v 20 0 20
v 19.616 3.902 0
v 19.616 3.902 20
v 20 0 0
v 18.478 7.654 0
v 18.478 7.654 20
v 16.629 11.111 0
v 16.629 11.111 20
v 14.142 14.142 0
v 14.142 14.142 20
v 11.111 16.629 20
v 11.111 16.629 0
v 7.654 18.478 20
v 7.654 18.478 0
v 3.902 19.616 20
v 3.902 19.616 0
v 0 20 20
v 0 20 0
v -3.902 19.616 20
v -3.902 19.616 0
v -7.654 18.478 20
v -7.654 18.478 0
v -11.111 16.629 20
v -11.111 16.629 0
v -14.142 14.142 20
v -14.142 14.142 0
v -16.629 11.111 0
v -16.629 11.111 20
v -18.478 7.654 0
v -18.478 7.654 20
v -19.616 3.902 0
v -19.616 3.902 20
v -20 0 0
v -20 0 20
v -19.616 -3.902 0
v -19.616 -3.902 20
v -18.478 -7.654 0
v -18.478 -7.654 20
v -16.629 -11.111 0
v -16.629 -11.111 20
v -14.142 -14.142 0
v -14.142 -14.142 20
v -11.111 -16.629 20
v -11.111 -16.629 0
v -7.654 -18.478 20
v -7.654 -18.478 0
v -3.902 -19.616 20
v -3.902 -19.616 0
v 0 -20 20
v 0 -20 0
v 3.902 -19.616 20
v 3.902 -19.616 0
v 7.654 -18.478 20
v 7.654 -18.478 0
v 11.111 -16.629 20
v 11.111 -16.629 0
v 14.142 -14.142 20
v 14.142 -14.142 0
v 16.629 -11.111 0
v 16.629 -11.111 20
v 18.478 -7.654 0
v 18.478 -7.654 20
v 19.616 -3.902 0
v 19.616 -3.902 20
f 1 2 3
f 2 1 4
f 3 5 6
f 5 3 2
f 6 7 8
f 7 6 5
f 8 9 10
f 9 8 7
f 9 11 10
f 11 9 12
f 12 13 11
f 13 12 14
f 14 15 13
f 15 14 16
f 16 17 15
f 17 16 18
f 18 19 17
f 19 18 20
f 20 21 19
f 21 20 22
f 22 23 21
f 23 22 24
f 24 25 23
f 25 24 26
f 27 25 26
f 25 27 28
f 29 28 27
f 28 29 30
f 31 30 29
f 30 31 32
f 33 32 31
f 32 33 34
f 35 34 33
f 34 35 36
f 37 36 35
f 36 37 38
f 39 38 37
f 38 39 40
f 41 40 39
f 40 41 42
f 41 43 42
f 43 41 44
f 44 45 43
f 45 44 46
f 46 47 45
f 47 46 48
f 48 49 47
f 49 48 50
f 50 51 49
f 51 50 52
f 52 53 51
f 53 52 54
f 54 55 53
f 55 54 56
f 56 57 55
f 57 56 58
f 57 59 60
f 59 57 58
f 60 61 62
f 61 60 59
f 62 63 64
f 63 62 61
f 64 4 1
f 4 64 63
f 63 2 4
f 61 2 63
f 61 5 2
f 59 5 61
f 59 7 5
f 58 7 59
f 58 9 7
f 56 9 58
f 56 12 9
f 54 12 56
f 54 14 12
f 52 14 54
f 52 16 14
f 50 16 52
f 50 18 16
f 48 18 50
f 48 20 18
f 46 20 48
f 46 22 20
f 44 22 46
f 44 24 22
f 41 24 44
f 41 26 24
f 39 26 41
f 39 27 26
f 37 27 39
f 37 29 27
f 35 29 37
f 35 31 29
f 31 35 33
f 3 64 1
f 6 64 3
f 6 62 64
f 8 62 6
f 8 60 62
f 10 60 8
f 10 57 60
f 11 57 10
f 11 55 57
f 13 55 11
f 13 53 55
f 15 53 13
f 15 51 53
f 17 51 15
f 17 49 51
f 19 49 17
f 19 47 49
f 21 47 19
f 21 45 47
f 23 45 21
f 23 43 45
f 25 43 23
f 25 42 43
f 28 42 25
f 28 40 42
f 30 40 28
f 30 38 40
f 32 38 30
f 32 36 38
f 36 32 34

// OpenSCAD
/* [Global] */
// Resolution shared by every section.
resolution = 32; // [8:8:96]

/* [Geometry] */
// Width in millimeters.
// Drag the slider or enter a number.
width = 40; // [10:5:100]
// Height with a maximum-only slider.
height = 20; // [100]
// Wall thickness, adjusted in half-millimeter steps.
wall = 2.5; // .5
// X, Y, Z dimensions of the model.
size = [10, 20, 30]; // [0:5:100]
// Four-component vector.
rotation = [0, 0, 1, 45]; // [-180:1:180]

/* [Appearance] */
// Select a shape.
shape = "round"; // [round:Round, square:Square]
// Select a numeric quality level.
quality = 2; // [1:Draft, 2:Normal, 3:Fine]
// Enable a hollow model.
hollow = true;
// Label text, at most 20 characters.
label = "Model"; // 20

/* [Hidden] */
internal_offset = 0.01;

$fn = resolution;
if (shape == "round") {
    cylinder(d = width, h = height);
} else {
    cube([width, width, height]);
}
